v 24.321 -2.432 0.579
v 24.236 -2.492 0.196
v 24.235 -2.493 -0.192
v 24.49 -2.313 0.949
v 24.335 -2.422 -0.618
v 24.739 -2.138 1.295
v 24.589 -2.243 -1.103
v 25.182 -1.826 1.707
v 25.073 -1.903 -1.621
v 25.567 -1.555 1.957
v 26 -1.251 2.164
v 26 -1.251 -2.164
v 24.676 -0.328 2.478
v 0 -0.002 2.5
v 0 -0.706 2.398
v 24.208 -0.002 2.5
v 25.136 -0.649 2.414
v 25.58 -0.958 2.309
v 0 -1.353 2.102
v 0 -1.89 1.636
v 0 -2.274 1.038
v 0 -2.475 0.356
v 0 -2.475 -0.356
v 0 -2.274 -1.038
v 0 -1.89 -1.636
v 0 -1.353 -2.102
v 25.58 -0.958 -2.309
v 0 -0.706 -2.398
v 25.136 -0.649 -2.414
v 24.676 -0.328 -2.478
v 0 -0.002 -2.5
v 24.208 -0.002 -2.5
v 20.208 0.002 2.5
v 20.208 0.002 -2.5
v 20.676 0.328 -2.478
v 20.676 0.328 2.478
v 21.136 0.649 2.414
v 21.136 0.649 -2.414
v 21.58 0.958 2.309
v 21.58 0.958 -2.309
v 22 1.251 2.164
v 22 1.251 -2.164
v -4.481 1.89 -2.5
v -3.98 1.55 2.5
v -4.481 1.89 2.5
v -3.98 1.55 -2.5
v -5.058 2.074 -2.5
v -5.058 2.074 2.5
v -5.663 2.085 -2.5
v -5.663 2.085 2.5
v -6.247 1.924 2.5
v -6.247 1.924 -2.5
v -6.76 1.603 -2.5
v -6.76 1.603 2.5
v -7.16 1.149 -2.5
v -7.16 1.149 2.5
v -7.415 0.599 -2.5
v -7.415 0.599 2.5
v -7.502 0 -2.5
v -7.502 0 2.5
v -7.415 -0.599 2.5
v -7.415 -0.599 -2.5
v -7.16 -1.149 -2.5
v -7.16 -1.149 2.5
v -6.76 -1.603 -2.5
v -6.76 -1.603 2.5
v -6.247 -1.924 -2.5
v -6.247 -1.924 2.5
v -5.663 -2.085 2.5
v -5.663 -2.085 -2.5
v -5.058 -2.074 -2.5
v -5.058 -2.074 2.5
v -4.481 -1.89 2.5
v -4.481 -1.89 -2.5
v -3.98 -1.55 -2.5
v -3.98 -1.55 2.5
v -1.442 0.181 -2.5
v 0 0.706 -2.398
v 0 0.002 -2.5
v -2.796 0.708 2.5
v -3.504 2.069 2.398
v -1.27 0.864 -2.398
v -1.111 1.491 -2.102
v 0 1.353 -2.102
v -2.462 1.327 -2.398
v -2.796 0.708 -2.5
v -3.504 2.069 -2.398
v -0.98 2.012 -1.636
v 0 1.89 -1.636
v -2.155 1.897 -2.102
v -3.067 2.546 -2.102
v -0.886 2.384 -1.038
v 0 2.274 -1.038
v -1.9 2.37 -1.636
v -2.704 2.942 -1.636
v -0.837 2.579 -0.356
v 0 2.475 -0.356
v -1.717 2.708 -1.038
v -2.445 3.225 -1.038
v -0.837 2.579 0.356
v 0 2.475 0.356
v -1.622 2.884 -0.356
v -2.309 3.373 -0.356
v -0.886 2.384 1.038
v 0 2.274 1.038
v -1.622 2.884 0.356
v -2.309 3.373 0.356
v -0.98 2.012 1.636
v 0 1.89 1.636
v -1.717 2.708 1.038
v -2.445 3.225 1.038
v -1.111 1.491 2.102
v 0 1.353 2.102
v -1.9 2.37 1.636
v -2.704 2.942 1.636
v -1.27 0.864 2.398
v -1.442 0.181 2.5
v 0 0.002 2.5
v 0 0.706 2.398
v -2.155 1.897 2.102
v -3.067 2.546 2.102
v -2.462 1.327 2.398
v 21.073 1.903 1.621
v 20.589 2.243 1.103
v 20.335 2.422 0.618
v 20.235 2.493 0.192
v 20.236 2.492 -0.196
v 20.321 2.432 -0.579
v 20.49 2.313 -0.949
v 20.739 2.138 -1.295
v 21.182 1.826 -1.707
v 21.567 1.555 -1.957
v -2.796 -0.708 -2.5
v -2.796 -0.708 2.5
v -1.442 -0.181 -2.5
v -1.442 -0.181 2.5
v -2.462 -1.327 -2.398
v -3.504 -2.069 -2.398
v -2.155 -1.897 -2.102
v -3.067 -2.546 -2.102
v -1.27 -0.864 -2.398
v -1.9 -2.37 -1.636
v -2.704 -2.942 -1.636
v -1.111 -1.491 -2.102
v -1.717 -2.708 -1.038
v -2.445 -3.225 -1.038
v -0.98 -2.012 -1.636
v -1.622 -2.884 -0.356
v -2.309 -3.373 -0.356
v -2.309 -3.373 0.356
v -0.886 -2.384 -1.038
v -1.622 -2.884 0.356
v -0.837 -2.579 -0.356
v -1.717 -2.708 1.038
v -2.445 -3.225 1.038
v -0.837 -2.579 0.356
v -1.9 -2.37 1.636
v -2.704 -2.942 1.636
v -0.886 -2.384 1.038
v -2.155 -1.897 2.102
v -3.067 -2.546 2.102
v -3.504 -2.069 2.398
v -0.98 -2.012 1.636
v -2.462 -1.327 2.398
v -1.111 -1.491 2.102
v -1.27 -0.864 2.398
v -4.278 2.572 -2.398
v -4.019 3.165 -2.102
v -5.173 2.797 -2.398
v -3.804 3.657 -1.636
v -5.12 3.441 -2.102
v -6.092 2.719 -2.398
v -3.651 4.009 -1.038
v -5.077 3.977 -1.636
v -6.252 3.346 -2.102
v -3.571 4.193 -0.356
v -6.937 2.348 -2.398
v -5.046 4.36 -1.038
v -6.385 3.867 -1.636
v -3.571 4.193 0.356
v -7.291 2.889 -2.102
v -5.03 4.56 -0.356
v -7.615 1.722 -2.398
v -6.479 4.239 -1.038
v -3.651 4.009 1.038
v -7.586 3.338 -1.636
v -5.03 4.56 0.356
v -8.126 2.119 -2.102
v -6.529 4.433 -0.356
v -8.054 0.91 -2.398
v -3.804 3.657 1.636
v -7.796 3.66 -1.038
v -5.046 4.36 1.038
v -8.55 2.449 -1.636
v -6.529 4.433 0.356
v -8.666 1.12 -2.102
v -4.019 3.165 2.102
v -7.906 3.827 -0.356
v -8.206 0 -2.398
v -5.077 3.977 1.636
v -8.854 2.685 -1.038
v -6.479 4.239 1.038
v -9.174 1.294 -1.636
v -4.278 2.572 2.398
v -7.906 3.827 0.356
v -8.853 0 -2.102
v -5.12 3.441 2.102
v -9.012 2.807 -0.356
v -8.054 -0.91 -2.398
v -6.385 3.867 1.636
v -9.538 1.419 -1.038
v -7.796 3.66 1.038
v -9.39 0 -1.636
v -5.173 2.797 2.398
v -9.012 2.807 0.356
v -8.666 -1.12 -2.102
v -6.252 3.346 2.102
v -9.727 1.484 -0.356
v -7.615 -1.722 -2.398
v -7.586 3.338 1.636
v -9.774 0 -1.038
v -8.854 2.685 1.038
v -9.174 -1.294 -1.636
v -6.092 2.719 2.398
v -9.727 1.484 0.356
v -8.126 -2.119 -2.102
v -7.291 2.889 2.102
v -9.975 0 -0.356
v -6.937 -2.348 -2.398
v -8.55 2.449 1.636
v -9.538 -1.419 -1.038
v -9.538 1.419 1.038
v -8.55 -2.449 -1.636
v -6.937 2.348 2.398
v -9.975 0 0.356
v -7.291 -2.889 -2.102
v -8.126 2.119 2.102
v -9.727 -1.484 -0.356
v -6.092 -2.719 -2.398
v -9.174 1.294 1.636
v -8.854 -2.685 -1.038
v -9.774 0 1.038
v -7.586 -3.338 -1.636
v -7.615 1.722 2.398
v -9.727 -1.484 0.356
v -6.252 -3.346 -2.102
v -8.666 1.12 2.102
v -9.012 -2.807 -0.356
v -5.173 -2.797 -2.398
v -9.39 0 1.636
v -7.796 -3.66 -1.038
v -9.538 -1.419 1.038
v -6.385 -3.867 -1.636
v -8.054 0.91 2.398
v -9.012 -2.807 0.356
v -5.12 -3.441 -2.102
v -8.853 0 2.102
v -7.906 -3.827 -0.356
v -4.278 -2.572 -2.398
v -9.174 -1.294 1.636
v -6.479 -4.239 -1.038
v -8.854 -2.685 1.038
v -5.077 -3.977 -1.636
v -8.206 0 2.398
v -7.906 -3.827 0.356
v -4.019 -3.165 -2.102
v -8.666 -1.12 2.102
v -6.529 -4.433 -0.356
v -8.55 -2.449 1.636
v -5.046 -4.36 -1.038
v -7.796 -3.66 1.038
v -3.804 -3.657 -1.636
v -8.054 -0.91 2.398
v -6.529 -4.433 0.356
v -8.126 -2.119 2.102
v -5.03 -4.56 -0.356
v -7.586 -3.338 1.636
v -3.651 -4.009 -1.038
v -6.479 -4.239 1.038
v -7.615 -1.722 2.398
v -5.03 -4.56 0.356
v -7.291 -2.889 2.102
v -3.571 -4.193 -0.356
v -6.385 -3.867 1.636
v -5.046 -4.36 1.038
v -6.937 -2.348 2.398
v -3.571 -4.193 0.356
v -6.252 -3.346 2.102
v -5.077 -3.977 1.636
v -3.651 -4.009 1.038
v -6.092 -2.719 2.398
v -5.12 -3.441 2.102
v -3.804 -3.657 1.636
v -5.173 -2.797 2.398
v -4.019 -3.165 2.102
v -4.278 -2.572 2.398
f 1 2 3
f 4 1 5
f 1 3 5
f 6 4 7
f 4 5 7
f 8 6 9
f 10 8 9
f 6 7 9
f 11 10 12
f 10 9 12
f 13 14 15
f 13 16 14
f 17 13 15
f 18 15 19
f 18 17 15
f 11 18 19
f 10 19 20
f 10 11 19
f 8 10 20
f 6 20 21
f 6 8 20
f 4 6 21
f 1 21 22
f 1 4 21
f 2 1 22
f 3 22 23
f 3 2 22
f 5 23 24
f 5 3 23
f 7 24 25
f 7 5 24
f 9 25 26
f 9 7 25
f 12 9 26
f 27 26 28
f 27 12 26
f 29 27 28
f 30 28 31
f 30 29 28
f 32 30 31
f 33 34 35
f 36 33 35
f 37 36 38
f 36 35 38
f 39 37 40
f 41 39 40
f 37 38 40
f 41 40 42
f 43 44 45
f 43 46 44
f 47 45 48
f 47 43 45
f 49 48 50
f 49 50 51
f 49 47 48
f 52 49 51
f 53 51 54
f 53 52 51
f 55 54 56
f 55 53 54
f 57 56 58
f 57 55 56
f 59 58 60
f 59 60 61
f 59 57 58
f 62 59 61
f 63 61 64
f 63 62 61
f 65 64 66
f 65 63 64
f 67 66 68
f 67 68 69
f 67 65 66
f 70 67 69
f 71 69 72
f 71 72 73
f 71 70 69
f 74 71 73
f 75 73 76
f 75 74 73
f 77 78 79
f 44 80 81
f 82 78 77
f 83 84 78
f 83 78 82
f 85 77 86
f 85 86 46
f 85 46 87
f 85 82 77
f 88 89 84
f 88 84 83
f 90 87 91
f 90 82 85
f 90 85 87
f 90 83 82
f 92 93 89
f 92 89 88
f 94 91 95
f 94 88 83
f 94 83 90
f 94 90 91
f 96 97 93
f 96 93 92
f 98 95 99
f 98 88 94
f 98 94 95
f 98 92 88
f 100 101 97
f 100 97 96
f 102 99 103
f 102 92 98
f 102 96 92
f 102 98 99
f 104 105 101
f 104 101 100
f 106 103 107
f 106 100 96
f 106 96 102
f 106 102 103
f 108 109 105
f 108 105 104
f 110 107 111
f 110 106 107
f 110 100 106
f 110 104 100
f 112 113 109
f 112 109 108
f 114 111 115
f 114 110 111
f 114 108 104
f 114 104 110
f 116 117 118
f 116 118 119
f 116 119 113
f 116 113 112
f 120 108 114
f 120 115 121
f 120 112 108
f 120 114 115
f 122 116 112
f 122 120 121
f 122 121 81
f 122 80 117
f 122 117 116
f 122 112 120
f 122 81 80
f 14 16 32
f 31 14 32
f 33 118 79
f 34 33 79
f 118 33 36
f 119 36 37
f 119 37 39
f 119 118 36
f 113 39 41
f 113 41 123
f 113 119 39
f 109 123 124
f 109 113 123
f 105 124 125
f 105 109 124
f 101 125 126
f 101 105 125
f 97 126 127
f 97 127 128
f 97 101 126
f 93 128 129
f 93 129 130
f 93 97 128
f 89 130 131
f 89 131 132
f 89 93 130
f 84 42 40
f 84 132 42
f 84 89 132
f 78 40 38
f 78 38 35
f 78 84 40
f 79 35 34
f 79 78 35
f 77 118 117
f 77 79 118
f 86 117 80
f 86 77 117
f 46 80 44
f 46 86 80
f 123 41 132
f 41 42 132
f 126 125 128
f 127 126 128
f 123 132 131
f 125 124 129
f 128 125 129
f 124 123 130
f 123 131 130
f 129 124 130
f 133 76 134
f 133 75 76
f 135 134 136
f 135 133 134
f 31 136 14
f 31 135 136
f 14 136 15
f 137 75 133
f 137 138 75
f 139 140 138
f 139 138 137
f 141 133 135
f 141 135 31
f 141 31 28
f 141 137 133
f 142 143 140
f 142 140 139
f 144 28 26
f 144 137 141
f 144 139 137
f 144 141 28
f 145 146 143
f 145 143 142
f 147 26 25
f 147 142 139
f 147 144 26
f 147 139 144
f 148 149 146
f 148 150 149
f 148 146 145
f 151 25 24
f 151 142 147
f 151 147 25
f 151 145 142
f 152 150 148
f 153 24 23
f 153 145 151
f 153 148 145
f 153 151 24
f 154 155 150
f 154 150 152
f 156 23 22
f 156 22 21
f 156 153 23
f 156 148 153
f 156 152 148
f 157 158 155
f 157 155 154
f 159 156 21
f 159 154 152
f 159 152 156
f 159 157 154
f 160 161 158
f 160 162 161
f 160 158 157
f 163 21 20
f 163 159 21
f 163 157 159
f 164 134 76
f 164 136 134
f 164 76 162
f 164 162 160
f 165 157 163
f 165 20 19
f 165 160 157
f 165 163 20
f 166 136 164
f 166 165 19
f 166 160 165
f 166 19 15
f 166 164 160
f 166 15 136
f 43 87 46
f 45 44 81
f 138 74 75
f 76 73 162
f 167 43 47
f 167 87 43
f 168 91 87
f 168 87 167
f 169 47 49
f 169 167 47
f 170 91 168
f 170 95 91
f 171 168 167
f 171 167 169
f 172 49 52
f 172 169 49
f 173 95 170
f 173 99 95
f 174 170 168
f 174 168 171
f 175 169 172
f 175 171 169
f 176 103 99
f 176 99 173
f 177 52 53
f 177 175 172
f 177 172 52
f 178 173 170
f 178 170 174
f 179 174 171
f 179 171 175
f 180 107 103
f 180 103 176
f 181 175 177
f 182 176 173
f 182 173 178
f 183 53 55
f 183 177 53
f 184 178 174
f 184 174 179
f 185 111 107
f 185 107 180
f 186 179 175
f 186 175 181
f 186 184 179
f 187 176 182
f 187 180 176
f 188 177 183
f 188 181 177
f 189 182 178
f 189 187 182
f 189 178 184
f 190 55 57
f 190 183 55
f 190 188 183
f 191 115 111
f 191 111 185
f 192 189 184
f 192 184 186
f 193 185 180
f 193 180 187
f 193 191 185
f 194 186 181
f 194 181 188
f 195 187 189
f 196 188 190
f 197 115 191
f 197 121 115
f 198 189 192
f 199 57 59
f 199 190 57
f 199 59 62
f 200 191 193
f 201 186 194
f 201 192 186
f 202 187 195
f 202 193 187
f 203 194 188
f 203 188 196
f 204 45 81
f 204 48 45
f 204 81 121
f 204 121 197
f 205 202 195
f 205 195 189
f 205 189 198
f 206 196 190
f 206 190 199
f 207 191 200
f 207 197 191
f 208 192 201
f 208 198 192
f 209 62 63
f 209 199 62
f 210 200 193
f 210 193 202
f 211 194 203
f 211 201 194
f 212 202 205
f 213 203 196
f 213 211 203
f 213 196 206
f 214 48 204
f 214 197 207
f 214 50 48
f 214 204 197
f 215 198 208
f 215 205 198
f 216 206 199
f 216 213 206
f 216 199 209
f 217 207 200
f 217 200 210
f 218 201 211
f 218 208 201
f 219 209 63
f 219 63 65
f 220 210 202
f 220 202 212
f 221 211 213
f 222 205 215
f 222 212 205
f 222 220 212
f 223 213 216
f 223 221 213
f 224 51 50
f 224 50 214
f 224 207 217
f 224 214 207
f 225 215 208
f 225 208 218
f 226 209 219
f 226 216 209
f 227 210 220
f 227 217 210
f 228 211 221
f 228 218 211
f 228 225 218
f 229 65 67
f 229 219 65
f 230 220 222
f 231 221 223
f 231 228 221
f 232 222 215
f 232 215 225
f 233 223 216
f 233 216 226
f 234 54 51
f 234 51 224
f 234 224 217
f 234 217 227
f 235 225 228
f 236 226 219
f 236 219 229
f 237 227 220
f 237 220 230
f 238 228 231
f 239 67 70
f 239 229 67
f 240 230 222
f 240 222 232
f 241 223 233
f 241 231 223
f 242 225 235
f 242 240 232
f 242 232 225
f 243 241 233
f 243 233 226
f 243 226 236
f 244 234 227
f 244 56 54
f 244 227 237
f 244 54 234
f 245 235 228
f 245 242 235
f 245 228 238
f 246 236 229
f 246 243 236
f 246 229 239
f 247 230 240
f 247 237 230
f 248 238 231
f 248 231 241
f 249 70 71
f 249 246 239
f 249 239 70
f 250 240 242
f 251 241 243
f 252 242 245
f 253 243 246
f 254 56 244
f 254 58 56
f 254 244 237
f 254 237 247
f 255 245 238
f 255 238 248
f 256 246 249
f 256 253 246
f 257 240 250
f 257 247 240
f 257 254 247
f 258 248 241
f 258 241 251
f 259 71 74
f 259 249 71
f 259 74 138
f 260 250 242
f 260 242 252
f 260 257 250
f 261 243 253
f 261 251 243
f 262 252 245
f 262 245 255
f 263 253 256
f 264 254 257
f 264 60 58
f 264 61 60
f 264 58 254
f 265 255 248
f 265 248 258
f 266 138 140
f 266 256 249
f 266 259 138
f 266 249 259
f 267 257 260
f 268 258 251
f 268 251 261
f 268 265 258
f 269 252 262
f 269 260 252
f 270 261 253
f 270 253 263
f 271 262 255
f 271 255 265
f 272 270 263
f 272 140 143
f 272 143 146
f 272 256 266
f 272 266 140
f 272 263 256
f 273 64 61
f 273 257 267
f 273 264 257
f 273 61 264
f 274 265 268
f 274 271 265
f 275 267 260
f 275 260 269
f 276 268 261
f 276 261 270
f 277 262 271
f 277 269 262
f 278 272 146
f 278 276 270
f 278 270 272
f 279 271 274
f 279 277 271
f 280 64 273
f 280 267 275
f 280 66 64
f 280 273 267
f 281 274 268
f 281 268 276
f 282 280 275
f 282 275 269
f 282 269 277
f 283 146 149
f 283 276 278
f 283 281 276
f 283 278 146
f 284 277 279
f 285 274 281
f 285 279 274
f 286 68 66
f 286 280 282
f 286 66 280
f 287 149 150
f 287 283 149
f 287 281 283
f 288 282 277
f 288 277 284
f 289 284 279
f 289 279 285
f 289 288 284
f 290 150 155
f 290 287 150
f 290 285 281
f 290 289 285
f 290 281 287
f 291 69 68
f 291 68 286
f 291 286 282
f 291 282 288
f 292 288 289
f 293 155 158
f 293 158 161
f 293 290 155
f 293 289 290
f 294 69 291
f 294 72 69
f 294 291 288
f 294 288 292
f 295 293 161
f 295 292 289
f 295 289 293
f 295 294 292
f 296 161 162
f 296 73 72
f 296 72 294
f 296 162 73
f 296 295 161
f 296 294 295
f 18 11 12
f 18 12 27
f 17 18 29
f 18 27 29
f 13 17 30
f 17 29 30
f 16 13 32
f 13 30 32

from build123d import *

# Parameters (mm, degrees)
CONECUT_DEPTH      = 27.521877713
CONECUT_DEPTH_BACK = 27.521877713


with BuildPart() as part:
    # Body: sweep along a path in 草图2
    with BuildLine(Plane.XY) as body_path:
        Line((22, 2.5), (0, 2.5))
        ThreePointArc((0, 2.5), (-1.229728386, 2.730698436), (-2.292225201, 3.391420912))
        ThreePointArc((-2.292225201, 3.391420912), (-10, 0), (-2.292225201, -3.391420912))
        ThreePointArc((-2.292225201, -3.391420912), (-1.229728386, -2.730698436), (0, -2.5))
        Line((0, -2.5), (26, -2.5))
    # 草图1 → Body (sweep)
    with BuildSketch(Plane(origin=(22, 0, 0), x_dir=(0, 0, -1), z_dir=(1, 0, 0))):
        with BuildLine():
            Line((-2.4999992, 0.002), (2.4999992, 0.002))
            ThreePointArc((2.4999992, 0.002), (0, 2.5), (-2.4999992, 0.002))
        make_face()
    sweep(path=body_path.line)

    # 草图3 → ConeCut (cut, two sides: drawn at the far end of the back side and taken through both)
    with BuildSketch(Plane.XY.offset(-CONECUT_DEPTH_BACK)):
        Polygon((22, 1.251), (20.210475082, 2.51), (26.01, 2.51), (26.01, -2.51), (24.210475082, -2.51), (26, -1.251), (24.204873421, 0), (20.204873421, 0), align=None)
    extrude(amount=CONECUT_DEPTH + CONECUT_DEPTH_BACK, mode=Mode.SUBTRACT)


solid = part.part
